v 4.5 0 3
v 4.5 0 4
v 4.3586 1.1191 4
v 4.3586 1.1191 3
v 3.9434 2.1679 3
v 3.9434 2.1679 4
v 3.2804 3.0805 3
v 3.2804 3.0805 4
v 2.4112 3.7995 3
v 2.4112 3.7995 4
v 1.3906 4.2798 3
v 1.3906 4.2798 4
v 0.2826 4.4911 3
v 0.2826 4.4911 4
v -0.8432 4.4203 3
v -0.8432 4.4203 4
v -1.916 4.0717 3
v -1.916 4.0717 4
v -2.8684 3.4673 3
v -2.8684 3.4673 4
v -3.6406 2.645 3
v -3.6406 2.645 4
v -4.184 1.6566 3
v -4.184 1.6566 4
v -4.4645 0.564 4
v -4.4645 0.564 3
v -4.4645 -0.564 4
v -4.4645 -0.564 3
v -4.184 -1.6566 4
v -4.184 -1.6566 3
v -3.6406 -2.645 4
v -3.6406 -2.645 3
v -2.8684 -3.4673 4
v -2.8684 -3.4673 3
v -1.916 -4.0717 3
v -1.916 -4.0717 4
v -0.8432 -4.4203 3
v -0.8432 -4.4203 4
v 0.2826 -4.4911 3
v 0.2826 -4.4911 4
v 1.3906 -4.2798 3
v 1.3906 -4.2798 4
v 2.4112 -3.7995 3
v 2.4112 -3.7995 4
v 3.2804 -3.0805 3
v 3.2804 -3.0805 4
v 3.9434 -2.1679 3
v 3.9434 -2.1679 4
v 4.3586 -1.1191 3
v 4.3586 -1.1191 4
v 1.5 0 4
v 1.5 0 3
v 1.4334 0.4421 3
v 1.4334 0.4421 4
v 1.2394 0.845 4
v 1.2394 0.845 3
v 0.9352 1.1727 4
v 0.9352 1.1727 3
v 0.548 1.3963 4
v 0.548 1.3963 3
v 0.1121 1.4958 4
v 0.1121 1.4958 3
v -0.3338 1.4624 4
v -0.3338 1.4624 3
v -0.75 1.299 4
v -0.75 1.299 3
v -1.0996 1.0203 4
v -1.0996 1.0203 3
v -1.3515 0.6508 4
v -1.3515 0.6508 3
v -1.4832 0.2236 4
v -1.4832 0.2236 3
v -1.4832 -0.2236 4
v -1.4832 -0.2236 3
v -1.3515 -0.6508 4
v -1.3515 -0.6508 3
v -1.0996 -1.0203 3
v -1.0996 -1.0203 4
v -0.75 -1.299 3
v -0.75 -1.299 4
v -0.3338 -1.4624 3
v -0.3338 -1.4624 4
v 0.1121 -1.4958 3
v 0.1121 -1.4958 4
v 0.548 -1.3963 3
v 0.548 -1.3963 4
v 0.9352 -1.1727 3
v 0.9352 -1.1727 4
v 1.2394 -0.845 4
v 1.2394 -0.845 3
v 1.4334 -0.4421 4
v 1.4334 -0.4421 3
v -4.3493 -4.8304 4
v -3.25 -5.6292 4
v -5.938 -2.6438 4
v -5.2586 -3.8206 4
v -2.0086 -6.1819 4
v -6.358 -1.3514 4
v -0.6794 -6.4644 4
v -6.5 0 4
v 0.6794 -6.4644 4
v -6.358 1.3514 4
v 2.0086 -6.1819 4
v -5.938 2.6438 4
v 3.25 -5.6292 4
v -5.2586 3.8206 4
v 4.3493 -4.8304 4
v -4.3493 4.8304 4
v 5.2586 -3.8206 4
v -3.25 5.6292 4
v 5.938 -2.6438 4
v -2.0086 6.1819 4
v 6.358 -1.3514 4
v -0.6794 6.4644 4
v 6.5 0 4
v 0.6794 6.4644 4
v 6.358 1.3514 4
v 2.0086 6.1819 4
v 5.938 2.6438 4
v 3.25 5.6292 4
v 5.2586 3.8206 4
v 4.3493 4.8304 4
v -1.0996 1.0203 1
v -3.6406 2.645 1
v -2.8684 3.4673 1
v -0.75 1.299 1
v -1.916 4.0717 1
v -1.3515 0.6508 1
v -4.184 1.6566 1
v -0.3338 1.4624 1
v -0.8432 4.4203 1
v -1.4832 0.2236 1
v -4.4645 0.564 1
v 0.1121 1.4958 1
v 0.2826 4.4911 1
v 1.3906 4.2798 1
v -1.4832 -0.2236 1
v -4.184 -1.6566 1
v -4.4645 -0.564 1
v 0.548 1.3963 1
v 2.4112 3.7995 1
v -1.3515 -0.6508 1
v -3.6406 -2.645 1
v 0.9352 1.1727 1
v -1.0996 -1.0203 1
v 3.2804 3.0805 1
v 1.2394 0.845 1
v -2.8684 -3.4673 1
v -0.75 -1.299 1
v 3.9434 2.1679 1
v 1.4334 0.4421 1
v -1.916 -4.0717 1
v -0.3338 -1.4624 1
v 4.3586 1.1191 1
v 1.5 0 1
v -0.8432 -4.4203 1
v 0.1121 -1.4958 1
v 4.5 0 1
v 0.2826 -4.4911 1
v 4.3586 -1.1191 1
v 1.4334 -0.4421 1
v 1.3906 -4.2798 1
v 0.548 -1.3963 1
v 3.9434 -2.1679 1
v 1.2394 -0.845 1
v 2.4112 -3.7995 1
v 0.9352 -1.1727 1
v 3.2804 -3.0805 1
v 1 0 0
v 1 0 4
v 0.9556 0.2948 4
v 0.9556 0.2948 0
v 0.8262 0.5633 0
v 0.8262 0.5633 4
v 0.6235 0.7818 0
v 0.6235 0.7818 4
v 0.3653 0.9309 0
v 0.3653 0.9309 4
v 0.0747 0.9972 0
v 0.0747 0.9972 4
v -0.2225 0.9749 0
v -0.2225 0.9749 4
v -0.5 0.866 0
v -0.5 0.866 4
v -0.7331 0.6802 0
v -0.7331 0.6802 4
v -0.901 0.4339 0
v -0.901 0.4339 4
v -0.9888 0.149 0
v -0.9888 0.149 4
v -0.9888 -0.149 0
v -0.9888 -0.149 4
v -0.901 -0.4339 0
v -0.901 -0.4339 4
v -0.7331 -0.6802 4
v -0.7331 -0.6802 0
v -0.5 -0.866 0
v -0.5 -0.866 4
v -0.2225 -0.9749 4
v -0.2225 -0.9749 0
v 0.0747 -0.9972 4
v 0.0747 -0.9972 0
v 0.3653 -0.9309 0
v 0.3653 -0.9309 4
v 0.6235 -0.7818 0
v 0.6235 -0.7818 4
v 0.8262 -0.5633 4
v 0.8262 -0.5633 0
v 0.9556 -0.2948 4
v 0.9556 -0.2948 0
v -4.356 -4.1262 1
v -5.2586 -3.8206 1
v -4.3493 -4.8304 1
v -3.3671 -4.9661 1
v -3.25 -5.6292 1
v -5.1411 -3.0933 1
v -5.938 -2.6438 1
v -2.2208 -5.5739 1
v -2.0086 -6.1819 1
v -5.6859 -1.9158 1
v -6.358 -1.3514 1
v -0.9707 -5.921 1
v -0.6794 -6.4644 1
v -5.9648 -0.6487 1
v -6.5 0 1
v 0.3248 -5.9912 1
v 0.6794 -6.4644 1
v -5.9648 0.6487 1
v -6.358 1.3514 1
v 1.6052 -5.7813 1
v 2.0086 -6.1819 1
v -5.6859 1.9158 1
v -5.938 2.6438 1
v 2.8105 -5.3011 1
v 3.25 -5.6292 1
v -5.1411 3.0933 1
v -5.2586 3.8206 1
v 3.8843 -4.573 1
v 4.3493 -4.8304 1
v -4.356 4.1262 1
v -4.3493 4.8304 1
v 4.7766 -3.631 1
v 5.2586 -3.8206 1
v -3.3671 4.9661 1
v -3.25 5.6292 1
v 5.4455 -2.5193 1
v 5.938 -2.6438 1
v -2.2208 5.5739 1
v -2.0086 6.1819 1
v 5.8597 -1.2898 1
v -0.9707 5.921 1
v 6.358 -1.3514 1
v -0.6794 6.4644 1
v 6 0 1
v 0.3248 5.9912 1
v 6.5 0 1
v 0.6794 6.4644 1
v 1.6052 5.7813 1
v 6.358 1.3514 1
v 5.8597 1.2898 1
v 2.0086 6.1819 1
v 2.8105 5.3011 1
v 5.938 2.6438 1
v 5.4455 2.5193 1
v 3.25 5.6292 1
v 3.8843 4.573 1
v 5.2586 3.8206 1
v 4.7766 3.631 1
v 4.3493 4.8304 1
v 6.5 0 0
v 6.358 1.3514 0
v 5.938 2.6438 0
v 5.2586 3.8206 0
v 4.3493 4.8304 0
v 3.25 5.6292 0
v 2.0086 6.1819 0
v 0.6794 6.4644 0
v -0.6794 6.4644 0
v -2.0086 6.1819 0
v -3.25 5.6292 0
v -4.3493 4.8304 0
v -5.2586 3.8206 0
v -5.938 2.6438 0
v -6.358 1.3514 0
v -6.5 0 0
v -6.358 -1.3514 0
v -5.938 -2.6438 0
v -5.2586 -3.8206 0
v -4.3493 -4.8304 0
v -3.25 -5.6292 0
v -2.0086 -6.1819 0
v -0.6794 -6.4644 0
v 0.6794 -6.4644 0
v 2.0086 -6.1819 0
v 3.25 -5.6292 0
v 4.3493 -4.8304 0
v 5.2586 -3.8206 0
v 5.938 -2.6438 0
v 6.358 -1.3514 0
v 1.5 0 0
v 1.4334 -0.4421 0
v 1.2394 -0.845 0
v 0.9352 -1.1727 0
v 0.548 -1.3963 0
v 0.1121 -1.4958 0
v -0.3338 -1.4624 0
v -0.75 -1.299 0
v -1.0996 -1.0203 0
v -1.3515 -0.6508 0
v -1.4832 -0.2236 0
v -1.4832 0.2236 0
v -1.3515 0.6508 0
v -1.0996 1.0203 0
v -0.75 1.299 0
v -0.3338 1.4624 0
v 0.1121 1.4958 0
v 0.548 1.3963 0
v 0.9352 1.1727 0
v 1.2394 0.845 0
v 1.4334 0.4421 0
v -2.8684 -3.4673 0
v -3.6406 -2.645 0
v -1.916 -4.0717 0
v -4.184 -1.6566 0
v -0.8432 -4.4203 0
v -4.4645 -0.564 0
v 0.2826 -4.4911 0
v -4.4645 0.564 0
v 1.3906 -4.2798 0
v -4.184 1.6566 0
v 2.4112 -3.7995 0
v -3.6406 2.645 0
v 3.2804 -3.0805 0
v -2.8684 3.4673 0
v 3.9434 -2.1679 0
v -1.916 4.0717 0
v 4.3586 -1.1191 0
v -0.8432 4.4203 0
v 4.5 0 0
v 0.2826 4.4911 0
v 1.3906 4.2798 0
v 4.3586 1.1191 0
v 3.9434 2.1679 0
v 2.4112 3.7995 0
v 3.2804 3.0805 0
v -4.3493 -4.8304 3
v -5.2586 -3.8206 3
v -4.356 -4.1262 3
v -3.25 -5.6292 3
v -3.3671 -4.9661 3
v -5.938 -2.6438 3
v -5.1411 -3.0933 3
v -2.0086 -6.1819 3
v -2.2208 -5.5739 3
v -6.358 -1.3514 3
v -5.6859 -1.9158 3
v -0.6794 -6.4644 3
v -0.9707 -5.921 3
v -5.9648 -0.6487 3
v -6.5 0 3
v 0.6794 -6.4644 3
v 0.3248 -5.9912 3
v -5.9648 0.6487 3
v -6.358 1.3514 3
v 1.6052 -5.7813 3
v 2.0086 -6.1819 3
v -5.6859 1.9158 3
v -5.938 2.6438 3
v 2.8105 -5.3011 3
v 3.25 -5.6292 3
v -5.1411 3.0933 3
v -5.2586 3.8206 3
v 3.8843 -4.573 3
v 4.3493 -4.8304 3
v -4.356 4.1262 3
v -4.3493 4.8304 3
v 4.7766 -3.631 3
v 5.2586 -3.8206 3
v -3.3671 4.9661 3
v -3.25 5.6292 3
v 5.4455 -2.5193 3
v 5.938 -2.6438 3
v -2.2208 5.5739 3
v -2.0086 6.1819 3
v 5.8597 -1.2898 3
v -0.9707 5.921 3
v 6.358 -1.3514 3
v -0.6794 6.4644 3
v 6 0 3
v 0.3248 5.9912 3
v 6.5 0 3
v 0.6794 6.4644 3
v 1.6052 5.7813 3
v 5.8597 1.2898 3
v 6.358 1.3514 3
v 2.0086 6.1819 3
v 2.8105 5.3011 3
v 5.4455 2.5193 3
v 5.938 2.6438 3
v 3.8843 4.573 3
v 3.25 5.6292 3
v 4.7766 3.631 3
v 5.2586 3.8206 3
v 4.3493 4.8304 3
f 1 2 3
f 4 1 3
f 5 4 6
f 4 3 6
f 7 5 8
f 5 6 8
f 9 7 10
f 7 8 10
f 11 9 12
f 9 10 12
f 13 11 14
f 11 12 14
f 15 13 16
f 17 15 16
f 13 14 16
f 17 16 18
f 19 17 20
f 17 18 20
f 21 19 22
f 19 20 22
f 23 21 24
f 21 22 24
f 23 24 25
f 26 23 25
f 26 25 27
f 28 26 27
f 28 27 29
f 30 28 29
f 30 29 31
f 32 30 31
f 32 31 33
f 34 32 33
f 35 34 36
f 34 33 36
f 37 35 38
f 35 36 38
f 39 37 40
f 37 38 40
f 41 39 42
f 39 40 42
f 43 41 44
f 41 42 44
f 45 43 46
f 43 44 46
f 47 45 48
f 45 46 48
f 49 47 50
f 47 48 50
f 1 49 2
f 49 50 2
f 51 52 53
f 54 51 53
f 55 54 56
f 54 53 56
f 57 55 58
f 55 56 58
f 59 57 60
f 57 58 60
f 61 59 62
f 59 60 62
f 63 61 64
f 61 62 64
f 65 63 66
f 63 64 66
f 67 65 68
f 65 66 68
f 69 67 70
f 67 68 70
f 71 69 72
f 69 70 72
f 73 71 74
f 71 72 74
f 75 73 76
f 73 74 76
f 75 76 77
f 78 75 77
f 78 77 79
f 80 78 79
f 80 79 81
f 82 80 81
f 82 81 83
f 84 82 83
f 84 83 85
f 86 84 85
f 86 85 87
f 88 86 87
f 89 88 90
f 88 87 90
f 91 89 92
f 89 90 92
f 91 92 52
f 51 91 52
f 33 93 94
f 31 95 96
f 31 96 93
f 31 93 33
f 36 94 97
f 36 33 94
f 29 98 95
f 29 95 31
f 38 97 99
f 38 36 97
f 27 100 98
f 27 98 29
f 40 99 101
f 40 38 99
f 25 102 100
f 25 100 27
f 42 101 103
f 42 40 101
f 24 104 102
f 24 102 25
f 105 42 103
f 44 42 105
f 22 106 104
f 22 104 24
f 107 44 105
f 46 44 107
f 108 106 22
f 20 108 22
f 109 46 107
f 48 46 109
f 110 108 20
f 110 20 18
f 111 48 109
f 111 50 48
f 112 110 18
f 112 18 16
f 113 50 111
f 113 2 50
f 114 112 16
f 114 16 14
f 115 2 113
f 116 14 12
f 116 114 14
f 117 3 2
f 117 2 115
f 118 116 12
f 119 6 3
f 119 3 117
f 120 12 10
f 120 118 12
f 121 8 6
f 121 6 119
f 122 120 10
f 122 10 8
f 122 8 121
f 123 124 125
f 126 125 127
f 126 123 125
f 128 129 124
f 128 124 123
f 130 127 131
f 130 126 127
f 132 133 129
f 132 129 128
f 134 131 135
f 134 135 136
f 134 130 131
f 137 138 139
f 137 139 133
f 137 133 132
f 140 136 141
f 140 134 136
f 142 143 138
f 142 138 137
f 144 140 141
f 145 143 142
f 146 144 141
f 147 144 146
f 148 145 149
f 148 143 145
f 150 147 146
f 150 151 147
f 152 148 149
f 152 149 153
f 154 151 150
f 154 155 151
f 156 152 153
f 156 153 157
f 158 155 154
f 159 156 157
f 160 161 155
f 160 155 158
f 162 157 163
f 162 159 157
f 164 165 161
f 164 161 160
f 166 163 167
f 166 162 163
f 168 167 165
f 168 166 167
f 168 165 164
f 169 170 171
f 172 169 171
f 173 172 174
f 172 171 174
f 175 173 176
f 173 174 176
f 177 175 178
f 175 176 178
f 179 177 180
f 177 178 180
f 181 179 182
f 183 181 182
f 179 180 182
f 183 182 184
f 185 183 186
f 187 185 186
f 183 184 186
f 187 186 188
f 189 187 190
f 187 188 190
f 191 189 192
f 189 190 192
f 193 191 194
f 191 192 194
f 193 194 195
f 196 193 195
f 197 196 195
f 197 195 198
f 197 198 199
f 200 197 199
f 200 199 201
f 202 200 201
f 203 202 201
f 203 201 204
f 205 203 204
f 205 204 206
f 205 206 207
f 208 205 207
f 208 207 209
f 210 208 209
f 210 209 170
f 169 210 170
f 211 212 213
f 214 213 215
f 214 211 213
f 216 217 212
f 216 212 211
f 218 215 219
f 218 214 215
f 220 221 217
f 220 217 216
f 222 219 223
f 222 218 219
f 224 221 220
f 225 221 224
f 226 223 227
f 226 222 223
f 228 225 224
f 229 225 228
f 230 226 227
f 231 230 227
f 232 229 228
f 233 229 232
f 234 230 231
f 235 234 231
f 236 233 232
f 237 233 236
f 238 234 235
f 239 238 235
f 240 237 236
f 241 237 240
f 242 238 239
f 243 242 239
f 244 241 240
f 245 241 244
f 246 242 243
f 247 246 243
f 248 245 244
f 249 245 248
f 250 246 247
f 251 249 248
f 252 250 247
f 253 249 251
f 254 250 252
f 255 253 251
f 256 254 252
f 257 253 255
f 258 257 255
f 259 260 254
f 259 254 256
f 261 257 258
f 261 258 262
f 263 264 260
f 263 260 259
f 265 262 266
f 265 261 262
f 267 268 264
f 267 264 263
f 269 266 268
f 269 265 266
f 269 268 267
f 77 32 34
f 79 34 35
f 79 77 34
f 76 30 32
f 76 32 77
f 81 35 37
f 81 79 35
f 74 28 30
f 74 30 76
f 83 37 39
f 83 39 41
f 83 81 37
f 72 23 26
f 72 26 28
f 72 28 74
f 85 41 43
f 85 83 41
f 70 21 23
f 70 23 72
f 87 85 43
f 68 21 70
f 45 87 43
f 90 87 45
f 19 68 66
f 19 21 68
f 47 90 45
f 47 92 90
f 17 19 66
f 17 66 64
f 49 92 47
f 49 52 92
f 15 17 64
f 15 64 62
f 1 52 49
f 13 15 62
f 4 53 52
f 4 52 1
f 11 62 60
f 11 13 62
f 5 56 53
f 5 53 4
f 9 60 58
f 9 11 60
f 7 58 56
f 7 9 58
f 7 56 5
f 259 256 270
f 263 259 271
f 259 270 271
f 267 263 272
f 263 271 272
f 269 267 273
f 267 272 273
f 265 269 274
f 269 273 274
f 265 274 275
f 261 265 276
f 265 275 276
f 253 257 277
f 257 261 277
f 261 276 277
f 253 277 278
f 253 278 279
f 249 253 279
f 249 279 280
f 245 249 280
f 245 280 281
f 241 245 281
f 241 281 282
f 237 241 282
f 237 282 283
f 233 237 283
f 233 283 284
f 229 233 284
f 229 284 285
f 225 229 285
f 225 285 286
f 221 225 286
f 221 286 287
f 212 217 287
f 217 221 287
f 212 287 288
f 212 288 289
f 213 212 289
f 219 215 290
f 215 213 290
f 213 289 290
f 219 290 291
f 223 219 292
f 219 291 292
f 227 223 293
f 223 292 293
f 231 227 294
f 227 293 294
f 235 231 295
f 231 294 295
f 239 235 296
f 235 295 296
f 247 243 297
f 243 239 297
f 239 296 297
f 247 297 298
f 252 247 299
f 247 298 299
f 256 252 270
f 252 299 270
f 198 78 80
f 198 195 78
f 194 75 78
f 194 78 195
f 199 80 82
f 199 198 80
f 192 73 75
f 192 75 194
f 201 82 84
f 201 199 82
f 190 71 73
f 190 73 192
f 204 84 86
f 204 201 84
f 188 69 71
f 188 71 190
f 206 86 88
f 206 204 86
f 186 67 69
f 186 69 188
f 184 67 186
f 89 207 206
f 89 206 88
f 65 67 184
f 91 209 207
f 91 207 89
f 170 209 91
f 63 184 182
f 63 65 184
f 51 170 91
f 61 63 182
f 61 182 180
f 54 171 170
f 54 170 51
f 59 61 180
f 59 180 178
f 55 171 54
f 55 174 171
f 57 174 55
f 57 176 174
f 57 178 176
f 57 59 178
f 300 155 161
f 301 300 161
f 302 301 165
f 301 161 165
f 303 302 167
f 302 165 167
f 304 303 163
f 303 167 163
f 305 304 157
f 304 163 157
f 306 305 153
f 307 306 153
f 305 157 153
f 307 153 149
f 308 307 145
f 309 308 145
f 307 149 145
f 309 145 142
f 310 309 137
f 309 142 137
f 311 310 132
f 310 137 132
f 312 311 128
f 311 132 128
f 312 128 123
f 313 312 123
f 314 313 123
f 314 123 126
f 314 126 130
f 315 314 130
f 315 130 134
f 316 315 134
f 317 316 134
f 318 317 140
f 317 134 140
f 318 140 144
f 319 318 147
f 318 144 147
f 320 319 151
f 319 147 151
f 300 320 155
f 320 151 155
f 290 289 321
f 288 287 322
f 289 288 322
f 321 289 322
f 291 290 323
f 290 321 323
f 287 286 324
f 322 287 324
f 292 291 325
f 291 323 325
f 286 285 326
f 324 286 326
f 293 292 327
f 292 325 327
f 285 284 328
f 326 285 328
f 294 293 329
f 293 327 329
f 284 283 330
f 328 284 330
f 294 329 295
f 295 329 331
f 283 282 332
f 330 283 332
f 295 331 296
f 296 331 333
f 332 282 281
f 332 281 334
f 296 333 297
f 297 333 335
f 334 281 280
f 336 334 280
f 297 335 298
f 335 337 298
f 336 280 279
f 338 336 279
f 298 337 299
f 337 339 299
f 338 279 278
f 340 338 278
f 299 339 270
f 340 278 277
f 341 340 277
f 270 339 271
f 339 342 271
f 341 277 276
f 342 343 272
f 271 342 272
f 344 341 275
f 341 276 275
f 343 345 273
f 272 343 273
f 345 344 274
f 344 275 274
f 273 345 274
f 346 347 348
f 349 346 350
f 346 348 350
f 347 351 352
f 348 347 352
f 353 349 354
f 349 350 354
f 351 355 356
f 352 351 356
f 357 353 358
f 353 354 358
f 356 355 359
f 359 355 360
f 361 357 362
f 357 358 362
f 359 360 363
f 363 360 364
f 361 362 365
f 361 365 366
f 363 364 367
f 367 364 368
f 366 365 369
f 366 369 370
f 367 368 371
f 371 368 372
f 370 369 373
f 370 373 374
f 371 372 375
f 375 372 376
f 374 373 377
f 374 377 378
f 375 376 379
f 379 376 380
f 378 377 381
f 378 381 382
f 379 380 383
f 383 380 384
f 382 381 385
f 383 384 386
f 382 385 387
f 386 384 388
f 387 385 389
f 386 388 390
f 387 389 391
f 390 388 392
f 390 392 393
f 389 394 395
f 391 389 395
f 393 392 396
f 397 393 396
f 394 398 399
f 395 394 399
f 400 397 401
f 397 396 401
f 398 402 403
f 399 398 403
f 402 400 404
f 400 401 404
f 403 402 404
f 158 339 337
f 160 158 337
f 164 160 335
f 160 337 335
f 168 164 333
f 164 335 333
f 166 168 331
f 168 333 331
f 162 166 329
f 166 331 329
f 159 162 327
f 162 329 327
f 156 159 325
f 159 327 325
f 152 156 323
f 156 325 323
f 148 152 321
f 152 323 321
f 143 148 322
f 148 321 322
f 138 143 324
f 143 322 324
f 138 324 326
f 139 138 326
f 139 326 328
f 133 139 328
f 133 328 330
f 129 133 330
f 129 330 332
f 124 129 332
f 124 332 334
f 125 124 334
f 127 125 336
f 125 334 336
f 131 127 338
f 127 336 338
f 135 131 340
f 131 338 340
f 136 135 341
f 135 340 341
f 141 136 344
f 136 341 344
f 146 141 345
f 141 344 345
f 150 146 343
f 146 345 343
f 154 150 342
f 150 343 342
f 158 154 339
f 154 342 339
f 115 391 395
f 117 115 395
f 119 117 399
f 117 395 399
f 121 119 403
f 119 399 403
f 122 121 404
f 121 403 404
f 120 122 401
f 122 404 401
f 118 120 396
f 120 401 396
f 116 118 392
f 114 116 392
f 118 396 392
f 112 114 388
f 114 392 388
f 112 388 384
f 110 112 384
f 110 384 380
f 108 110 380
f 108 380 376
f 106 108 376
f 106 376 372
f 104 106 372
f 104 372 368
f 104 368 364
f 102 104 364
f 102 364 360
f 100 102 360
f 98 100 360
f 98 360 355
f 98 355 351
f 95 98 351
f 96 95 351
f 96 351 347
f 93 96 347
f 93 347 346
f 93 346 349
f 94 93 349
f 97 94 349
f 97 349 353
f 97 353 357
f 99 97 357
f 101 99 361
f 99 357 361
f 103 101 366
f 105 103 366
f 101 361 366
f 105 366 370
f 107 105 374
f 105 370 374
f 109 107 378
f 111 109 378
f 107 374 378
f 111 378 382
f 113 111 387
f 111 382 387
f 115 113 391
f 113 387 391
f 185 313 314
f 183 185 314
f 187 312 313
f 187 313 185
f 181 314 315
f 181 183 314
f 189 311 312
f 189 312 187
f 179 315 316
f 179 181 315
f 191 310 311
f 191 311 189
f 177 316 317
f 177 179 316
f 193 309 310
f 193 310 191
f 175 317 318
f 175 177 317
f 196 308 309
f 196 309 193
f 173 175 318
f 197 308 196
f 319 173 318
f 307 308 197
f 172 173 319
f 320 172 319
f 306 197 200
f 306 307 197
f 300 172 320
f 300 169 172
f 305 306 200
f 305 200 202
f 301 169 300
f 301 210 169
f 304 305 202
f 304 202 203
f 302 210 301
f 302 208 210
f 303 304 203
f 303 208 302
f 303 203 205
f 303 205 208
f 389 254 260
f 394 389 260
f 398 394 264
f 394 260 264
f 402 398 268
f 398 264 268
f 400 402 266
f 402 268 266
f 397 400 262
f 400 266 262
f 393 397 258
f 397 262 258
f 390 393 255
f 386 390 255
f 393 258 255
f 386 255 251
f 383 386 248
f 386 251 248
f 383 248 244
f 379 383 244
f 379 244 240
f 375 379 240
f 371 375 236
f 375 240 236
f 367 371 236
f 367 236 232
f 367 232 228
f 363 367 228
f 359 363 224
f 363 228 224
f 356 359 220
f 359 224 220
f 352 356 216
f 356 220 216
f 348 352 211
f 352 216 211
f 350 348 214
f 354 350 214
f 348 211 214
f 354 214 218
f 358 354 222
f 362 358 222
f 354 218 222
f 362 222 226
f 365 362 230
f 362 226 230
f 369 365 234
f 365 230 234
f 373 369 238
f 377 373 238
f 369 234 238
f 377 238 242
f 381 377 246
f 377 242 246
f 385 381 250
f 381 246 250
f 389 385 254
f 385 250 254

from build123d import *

# Parameters (mm, degrees)
F0_R      = 6.5
F1_DEPTH  = 4
F2_R      = 4.5
F3_DEPTH  = 1
F4_R      = 4.5
F5_DEPTH  = 1
F6_R      = 1.5
F7_DEPTH  = 1
F8_R      = 1.5
F9_DEPTH  = 1
F10_R     = 1
F11_DEPTH = 25
F13_R     = 8.657699
F13_R_2   = 6
F14_DEPTH = 2


with BuildPart() as f1:
    # F0 (on Top) → F1 (new body)
    with BuildSketch(Plane.XY):
        Circle(F0_R)
    extrude(amount=F1_DEPTH)

    # F2 (on face) → F3 (cut)
    with BuildSketch(Plane(origin=(0, 0, 0), x_dir=(1, 0, 0), z_dir=(0, 0, -1))):
        Circle(F2_R)
    extrude(amount=-F3_DEPTH, mode=Mode.SUBTRACT)

    # F4 (on face) → F5 (cut)
    with BuildSketch(Plane.XY.offset(4)):
        Circle(F4_R)
    extrude(amount=-F5_DEPTH, mode=Mode.SUBTRACT)

    # F6 (on face) → F7 (join)
    with BuildSketch(Plane(origin=(0, 0, 1), x_dir=(1, 0, 0), z_dir=(0, 0, -1))):
        Circle(F6_R)
    extrude(amount=F7_DEPTH)

    # F8 (on face) → F9 (join)
    with BuildSketch(Plane.XY.offset(3)):
        Circle(F8_R)
    extrude(amount=F9_DEPTH)

    # F10 (on face) → F11 (cut)
    with BuildSketch(Plane.XY.offset(4)):
        Circle(F10_R)
    extrude(amount=-F11_DEPTH, mode=Mode.SUBTRACT)

    # F13 (on offset) → F14 (cut)
    with BuildSketch(Plane.XY.offset(1)):
        Circle(F13_R)
        Circle(F13_R_2, mode=Mode.SUBTRACT)
    extrude(amount=F14_DEPTH, mode=Mode.SUBTRACT)


solid = f1.part
